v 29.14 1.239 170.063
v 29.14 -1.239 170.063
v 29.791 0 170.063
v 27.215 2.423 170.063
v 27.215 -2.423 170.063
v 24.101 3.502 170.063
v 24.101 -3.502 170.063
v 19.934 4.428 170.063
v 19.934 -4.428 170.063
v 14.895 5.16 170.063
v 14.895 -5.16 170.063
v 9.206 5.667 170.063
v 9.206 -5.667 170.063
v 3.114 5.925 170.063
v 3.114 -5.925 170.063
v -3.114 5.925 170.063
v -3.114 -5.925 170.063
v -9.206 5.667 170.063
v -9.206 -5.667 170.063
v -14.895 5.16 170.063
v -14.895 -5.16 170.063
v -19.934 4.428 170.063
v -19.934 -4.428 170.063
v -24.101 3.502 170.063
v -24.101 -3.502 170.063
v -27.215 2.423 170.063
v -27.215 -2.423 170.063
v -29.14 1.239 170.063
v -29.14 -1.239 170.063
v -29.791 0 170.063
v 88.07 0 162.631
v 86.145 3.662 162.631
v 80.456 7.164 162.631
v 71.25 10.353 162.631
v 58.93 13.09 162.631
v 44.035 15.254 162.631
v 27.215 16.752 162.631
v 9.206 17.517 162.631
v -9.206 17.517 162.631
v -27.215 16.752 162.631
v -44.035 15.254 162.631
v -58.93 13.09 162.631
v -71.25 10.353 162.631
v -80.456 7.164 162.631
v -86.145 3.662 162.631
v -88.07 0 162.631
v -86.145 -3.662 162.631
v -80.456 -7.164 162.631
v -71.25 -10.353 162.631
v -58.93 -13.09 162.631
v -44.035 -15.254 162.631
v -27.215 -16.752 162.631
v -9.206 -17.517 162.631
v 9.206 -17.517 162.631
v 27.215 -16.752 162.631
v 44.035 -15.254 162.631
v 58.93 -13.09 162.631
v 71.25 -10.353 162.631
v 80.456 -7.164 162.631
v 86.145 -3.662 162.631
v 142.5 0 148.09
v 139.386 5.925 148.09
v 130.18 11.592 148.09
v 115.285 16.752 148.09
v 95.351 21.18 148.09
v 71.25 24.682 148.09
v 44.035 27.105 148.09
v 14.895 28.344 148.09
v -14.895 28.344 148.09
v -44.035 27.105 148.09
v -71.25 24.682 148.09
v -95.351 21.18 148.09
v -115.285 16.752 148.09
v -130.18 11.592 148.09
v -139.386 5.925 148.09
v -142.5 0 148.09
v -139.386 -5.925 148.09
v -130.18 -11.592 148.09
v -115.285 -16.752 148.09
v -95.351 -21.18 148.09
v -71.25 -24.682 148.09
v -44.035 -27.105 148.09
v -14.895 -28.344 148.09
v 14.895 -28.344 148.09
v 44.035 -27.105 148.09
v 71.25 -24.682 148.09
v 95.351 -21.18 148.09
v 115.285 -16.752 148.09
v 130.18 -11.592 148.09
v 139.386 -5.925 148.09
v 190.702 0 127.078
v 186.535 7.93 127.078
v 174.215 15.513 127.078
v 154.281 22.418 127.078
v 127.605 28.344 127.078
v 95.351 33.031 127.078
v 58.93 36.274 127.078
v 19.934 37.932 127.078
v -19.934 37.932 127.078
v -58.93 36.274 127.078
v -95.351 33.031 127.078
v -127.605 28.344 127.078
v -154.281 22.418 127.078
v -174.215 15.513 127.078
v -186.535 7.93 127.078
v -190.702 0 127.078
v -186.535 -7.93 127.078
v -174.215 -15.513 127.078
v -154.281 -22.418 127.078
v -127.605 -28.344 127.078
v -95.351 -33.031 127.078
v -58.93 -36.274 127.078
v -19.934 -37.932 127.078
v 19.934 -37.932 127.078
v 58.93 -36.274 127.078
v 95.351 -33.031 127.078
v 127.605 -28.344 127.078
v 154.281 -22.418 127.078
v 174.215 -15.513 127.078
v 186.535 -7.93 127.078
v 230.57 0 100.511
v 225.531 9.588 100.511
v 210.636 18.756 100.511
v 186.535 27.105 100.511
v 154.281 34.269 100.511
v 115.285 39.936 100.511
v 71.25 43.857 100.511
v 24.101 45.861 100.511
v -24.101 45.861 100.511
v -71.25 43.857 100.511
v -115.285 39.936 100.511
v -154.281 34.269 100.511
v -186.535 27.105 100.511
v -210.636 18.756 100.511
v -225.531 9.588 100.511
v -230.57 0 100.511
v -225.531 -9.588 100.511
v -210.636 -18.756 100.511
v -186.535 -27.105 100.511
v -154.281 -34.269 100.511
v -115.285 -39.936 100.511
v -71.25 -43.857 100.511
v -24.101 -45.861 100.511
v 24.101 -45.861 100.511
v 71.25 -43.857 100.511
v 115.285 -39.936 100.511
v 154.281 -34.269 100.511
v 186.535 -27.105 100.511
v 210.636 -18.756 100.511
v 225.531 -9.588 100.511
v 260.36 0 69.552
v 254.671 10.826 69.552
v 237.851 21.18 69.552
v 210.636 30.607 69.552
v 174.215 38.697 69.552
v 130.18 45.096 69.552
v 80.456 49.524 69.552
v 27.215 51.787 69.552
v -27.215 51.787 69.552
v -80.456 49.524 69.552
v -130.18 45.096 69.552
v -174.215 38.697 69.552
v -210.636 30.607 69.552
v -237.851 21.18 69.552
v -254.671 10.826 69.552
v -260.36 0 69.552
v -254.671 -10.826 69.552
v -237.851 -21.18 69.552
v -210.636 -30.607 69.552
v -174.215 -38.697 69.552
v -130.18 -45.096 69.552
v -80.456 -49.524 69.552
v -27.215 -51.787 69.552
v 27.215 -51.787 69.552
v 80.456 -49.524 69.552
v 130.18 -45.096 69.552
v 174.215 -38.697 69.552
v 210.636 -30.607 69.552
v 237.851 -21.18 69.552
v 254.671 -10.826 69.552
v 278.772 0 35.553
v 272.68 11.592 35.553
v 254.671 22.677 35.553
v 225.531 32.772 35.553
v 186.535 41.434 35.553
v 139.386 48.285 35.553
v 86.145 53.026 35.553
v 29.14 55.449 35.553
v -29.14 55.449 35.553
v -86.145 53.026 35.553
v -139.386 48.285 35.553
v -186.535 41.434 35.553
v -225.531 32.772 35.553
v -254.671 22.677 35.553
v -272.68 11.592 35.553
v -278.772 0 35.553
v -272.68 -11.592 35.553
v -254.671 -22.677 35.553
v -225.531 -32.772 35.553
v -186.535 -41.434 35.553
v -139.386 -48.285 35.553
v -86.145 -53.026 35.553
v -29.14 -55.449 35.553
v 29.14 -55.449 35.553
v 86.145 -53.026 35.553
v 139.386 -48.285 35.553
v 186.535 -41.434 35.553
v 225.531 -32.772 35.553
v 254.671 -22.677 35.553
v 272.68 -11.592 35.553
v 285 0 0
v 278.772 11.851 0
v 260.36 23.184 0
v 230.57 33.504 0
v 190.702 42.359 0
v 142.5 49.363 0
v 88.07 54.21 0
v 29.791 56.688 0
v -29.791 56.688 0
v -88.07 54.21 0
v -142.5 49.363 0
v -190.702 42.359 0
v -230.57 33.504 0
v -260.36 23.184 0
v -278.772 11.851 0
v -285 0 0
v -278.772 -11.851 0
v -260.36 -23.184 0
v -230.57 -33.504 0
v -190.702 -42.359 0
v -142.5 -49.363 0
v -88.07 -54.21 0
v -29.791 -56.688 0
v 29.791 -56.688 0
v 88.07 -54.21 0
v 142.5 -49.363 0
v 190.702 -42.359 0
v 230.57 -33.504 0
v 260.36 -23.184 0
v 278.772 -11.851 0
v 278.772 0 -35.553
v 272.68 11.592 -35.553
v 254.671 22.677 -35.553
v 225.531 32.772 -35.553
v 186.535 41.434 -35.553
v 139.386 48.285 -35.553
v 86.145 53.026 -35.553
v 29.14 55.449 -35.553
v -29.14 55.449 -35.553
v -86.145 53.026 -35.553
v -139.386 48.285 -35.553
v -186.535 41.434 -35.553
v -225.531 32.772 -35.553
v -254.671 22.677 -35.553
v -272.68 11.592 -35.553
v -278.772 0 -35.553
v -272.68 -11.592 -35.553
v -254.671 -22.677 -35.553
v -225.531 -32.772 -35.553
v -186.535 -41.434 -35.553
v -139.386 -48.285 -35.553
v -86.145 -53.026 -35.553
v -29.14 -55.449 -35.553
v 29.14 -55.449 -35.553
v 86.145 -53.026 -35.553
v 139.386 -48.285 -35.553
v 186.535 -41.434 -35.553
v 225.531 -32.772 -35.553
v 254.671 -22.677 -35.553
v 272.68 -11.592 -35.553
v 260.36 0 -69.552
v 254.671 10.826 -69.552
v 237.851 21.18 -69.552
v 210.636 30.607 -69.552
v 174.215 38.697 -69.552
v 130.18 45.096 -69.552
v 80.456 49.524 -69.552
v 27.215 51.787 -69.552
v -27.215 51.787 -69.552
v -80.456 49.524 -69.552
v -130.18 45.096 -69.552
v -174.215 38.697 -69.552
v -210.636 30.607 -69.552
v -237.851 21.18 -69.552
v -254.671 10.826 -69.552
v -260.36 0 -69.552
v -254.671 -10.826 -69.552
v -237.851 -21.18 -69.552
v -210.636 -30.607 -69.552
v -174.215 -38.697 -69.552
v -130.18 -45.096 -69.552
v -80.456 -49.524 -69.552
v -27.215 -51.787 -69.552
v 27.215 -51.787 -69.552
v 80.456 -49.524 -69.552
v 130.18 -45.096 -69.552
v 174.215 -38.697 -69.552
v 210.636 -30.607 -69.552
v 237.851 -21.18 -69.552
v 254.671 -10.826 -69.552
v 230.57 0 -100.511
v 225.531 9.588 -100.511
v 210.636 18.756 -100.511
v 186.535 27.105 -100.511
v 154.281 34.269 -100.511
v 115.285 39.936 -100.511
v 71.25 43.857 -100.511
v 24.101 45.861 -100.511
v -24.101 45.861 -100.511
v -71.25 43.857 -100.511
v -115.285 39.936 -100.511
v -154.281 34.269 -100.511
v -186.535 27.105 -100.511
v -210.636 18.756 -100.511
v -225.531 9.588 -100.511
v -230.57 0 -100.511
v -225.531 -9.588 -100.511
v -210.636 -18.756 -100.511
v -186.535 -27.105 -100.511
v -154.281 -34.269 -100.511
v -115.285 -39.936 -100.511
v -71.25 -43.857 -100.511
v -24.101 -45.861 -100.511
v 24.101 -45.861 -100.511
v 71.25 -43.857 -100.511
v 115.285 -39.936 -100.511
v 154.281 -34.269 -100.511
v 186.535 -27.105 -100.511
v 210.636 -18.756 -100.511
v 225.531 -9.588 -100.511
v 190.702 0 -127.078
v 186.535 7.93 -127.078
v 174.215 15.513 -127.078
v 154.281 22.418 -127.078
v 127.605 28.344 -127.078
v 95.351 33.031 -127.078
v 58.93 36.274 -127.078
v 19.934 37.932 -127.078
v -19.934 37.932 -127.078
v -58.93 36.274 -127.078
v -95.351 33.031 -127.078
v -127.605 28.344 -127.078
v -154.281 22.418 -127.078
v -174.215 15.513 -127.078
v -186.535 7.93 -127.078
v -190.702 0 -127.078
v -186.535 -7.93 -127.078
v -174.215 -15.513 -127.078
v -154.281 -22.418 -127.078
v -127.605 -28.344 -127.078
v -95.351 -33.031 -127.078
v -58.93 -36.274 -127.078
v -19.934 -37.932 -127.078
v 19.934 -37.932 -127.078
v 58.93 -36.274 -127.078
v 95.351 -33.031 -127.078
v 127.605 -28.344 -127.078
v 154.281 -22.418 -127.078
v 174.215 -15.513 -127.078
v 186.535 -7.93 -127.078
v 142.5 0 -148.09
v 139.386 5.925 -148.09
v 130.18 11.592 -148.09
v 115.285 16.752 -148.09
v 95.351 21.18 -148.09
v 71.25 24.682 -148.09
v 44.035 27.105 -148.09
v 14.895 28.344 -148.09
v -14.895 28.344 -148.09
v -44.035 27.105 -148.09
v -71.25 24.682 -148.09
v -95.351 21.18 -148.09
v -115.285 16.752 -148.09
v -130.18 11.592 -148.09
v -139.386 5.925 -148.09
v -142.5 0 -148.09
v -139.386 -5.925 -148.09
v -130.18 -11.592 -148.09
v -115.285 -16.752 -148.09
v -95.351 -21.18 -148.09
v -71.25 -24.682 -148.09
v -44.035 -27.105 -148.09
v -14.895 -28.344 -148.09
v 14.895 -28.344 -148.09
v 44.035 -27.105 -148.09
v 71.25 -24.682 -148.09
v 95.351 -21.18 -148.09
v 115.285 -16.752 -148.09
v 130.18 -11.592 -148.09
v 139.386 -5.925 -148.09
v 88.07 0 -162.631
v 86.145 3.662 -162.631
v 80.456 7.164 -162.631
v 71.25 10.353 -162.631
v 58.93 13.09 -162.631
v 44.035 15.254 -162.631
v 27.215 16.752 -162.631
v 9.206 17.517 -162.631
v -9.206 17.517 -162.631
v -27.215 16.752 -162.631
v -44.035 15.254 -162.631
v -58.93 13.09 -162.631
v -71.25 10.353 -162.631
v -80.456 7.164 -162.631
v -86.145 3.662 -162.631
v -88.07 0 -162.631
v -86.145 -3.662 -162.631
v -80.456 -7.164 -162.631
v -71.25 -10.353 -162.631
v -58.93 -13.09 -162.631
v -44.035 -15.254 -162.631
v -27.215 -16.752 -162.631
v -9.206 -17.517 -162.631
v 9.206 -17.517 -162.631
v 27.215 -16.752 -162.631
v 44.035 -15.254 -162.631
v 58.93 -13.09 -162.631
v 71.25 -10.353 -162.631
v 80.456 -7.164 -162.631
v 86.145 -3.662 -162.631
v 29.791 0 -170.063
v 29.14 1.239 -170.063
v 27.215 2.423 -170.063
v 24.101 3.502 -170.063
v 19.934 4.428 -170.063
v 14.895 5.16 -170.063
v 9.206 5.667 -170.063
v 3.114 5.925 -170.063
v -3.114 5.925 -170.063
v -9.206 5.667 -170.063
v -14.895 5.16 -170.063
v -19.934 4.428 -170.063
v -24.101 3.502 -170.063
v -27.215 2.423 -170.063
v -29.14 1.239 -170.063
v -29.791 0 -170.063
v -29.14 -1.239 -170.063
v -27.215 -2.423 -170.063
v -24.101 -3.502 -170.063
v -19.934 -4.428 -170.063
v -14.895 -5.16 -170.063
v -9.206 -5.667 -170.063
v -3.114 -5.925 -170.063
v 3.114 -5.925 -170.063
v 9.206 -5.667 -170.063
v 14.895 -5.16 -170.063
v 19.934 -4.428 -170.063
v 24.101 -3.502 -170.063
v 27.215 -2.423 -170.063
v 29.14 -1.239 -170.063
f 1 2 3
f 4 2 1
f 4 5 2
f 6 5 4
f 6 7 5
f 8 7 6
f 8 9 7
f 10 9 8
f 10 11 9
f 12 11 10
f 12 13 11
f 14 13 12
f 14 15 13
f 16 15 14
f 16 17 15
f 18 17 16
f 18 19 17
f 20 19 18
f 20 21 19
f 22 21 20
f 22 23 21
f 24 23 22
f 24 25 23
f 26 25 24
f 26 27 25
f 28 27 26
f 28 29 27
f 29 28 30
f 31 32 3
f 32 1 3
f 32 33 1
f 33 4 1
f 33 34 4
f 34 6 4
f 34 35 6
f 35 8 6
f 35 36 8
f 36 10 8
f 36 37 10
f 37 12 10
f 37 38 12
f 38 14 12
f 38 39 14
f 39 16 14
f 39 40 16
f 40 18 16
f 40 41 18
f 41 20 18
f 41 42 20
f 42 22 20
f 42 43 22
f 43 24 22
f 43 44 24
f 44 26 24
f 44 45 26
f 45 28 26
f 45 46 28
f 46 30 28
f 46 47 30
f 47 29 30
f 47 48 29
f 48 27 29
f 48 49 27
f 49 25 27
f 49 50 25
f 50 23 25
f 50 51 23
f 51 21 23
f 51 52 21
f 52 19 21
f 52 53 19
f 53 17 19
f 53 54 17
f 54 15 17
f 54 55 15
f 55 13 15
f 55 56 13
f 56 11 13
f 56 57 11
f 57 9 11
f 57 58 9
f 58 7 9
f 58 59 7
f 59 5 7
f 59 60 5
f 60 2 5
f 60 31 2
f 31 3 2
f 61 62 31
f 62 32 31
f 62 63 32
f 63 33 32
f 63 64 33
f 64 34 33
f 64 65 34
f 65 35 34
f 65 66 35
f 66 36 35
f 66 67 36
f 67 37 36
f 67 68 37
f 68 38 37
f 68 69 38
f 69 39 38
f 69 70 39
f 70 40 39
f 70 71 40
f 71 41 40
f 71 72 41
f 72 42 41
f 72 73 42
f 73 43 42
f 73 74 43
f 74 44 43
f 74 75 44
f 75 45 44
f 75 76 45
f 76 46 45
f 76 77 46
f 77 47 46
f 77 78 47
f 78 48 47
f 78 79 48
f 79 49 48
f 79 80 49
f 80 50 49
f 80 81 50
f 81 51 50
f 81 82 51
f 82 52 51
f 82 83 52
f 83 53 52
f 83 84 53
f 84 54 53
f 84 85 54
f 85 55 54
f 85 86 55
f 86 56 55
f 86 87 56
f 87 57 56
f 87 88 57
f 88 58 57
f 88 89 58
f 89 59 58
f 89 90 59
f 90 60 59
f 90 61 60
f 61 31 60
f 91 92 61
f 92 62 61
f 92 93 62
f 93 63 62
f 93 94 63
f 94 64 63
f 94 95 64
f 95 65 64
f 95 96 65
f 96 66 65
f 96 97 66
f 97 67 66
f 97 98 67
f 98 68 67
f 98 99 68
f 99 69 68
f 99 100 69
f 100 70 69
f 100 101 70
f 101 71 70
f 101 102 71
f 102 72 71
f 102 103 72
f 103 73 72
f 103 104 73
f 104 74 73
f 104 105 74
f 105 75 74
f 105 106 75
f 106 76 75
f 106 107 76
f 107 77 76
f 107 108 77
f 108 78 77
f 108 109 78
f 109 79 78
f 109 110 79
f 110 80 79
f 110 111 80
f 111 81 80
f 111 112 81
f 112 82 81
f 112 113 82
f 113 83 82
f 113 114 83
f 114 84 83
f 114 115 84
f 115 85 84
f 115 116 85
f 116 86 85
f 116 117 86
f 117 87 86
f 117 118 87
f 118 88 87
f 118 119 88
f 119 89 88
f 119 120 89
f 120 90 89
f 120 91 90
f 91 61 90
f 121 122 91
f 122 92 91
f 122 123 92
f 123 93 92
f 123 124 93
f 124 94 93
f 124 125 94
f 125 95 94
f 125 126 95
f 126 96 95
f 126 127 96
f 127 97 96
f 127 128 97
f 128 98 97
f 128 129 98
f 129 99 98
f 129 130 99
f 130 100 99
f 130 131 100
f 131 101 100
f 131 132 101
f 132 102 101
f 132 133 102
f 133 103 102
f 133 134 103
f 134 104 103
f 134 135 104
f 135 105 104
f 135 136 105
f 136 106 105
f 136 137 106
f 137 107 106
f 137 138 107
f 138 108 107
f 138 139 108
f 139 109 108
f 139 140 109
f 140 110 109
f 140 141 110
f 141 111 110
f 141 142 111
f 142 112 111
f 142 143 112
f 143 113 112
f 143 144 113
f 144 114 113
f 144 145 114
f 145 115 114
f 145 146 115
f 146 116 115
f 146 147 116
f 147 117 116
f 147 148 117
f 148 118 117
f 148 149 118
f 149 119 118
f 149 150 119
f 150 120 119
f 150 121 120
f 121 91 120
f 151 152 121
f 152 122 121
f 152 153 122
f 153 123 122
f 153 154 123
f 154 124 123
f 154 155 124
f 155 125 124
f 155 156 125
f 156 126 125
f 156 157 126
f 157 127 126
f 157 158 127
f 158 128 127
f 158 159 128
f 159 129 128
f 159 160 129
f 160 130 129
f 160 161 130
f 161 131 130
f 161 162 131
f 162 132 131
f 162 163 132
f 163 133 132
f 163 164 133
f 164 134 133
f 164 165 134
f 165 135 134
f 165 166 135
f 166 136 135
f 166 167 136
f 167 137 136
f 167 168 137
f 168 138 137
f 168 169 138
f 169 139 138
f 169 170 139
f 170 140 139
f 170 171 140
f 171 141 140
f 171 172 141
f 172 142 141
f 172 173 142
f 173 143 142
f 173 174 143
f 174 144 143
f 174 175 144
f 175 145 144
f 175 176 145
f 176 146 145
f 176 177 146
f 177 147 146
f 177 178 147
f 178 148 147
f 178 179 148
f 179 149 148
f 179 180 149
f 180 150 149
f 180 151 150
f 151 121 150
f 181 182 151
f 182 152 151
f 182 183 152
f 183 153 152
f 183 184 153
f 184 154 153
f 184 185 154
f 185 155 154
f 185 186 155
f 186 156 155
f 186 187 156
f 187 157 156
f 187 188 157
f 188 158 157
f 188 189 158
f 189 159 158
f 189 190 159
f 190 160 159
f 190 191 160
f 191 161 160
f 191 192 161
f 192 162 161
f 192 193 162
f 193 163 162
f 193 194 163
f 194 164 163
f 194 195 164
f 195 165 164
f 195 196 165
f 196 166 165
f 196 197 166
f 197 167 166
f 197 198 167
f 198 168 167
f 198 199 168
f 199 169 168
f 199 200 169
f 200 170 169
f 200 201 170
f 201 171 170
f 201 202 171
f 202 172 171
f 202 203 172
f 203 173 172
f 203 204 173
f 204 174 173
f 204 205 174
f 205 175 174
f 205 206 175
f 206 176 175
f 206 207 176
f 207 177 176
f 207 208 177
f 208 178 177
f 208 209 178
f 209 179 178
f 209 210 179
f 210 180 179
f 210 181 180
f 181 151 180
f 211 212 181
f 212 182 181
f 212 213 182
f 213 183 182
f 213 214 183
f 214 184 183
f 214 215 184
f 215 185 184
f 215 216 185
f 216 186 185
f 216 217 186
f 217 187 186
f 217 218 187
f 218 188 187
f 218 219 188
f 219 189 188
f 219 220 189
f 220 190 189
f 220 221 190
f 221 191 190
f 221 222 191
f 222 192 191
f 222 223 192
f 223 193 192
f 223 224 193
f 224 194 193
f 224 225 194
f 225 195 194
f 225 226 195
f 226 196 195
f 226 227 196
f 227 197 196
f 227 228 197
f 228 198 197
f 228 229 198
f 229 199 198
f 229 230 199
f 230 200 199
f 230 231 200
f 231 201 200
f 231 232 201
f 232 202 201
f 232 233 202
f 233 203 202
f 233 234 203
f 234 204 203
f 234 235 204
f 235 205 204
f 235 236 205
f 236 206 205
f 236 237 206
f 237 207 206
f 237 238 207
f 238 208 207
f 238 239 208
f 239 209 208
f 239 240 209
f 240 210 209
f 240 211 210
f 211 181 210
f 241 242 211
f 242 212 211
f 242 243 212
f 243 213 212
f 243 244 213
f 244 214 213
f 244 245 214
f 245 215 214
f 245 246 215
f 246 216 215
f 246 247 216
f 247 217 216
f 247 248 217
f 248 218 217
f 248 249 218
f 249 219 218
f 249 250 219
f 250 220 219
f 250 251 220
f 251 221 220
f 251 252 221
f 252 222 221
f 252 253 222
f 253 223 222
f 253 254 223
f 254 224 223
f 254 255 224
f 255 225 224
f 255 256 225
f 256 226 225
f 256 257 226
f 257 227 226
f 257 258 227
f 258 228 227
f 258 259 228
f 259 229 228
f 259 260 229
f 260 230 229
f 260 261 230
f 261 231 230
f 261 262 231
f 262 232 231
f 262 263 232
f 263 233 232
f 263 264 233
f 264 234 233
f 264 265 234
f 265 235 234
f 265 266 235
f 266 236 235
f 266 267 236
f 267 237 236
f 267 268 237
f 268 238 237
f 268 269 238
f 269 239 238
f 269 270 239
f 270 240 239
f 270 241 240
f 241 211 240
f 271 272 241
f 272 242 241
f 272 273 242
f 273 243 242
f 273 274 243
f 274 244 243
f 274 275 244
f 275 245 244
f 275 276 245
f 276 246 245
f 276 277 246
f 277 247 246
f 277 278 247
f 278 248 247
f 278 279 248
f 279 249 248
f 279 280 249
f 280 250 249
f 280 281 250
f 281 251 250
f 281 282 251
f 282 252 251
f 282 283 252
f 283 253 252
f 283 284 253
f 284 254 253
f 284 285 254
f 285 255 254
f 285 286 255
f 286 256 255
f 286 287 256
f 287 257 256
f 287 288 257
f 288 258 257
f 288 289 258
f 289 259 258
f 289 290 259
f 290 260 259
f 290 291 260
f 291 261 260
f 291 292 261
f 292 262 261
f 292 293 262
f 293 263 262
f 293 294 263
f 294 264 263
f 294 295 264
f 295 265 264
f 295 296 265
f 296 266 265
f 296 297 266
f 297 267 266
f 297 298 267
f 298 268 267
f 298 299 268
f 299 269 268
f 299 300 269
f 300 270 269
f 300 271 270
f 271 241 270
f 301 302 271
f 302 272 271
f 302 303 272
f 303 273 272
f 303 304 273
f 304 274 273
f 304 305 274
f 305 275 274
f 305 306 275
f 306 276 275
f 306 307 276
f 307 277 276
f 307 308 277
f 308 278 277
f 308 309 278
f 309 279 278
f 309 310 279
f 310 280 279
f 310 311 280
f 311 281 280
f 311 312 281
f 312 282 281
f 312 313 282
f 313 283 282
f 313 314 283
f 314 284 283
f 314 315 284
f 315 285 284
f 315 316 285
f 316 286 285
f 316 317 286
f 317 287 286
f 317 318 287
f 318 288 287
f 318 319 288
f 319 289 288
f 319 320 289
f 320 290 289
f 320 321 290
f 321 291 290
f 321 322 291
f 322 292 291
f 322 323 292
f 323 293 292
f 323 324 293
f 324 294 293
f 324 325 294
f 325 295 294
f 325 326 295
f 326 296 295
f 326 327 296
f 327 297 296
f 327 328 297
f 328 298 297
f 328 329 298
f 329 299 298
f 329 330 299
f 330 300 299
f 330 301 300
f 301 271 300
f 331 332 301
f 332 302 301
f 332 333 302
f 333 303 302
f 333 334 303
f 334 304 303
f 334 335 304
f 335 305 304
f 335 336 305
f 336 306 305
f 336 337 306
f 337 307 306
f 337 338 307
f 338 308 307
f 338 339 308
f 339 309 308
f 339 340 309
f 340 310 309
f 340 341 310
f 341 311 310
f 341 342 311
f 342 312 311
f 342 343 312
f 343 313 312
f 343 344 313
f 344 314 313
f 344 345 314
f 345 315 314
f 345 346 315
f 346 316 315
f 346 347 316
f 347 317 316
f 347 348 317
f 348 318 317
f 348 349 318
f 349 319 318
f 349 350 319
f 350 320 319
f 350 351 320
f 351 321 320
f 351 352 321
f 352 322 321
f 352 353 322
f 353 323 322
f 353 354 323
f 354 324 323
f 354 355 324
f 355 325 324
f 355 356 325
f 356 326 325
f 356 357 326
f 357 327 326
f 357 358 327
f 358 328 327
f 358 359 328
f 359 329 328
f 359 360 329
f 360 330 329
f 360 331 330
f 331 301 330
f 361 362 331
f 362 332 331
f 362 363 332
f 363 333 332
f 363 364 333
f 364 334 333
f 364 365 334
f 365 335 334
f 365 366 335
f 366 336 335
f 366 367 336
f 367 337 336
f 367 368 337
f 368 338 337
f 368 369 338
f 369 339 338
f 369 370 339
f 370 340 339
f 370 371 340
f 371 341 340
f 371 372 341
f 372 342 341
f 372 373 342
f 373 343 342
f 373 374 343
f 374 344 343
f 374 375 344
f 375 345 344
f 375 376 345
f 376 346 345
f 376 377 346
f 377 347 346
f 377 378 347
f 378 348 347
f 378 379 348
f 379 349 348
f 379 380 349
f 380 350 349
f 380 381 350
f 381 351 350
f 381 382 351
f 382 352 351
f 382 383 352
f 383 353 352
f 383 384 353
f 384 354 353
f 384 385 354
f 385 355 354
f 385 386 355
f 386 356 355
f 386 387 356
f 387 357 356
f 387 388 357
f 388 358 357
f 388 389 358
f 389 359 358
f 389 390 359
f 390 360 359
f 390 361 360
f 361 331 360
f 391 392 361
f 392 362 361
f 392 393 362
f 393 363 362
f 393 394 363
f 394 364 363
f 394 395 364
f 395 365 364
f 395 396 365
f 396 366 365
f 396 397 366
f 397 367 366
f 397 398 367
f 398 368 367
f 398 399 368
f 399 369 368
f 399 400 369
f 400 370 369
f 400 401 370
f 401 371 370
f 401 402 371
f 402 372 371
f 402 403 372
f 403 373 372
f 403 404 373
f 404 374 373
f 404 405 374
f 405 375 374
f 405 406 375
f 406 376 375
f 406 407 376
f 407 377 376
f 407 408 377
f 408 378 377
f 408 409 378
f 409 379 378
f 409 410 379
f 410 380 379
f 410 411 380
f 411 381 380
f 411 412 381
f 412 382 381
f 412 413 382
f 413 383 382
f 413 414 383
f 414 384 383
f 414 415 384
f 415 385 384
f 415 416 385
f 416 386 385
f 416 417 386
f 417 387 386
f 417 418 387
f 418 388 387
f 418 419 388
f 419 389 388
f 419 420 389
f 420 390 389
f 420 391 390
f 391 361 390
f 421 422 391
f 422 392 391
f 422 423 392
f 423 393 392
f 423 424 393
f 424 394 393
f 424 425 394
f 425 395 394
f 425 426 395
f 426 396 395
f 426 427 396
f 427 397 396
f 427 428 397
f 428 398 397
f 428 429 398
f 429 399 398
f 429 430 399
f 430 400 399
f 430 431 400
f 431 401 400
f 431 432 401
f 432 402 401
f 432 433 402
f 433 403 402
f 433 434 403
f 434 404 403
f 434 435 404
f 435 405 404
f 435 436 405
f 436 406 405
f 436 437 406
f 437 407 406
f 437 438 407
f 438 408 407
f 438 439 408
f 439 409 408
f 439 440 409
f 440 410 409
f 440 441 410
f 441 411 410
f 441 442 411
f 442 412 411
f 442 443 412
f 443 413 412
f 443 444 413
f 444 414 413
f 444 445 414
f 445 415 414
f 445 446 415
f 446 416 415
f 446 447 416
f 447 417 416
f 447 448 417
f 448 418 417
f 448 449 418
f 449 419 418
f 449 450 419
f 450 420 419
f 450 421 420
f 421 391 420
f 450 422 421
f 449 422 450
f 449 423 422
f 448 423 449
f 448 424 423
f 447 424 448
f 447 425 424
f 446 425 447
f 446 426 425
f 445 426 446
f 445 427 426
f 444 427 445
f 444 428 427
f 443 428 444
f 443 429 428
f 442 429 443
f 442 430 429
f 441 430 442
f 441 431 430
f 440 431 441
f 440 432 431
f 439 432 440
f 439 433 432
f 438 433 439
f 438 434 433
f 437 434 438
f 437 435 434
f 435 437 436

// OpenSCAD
// Generated by SolidPython 1.0.1 on 2020-07-29 00:46:51


scale(v = [15, 3, 9]) {
	sphere(r = 19);
}
/***********************************************
*********      SolidPython code:      **********
************************************************
 
# import packages: SolidPython
from solid import *
from solid.utils import *
from itertools import chain, combinations, permutations


class Resize:

    def __init__(self, scad_file):
        self.scad_file = scad_file
        #self.scad_file = import_scad(scad_file)
        # cone/cylinder param:
        self.r1 = 0
        self.r2 = 0
        self.h = 0
        # rectangular prism param:
        self.w = 0
        self.l = 0
        # ellipse param:
        self.r = 0

    # import OpenScad code (file name corresponds to shape)


    # classify shape + parameters
    def assign(self, param1, param2, param3):
        if self.scad_file == 'cone.scad':
            self.r1 = param1
            self.r2 = param2
            self.h = param3
        elif self.scad_file == 'cylinder.scad':
            self.r1 = param1
            self.r2 = param2
            self.h = param3
        elif self.scad_file == 'rectangularPrism.scad':
            self.h = param1
            self.l = param2
            self.w = param3
        else:
            self.r = param1
            self.h = param2

    # resize parameters
    def iterate(self):
        x = range(3, 20, 2)
        i = 1
        if self.scad_file == 'cone.scad':
            tempList = list(permutations(x, 2))
            for temp in tempList:
                param1 = temp[0]
                param2 = temp[1]
                filepath = 'produced_scad_files/' + 'cone' + str(param1) + '_' + str(param2) + '_' + '.scad'
                scad_render_to_file(cylinder(h=param1, r1=param2, r2=0), filepath)

        elif self.scad_file == 'cylinder.scad':
            tempList = list(permutations(x, 3))
            for temp in tempList:
                param1 = temp[0]
                param2 = temp[1]
                filepath = 'produced_scad_files/' + 'cylinder' + str(param1) + '_' + str(param2) + '_' + '.scad'
                scad_render_to_file(cylinder(h=param1, r1=param2, r2=param2), filepath)

        elif self.scad_file == 'rectangularPrism.scad':
            tempList = list(permutations(x, 3))
            for temp in tempList:
                param1 = temp[0]
                param2 = temp[1]
                param3 = temp[2]
                filepath = 'produced_scad_files/' + 'rectangularPrism' + str(param1) + '_' + str(param2) + '_' + str(
                    param3) + '.scad'
                scad_render_to_file(cube(size=(param1, param2, param3)), filepath)

        elif self.scad_file == 'ellipse.scad':
            tempList = list(permutations(x, 4))
            for temp in tempList:
                param1 = temp[0]
                param2 = temp[1]
                param3 = temp[2]
                param4 = temp[3]
                filepath = 'produced_scad_files/' + 'ellipse' + str(param1) + '_' + str(param2) + '_' + str(param3) + '_' + str(param4) + '.scad'
                scad_render_to_file(scale([param1, param2, param3])(sphere(r=param4)), filepath)

    def render_to_scadfile(self):
        scad_render_to_file(scad, 'example.scad') 
 
************************************************/
